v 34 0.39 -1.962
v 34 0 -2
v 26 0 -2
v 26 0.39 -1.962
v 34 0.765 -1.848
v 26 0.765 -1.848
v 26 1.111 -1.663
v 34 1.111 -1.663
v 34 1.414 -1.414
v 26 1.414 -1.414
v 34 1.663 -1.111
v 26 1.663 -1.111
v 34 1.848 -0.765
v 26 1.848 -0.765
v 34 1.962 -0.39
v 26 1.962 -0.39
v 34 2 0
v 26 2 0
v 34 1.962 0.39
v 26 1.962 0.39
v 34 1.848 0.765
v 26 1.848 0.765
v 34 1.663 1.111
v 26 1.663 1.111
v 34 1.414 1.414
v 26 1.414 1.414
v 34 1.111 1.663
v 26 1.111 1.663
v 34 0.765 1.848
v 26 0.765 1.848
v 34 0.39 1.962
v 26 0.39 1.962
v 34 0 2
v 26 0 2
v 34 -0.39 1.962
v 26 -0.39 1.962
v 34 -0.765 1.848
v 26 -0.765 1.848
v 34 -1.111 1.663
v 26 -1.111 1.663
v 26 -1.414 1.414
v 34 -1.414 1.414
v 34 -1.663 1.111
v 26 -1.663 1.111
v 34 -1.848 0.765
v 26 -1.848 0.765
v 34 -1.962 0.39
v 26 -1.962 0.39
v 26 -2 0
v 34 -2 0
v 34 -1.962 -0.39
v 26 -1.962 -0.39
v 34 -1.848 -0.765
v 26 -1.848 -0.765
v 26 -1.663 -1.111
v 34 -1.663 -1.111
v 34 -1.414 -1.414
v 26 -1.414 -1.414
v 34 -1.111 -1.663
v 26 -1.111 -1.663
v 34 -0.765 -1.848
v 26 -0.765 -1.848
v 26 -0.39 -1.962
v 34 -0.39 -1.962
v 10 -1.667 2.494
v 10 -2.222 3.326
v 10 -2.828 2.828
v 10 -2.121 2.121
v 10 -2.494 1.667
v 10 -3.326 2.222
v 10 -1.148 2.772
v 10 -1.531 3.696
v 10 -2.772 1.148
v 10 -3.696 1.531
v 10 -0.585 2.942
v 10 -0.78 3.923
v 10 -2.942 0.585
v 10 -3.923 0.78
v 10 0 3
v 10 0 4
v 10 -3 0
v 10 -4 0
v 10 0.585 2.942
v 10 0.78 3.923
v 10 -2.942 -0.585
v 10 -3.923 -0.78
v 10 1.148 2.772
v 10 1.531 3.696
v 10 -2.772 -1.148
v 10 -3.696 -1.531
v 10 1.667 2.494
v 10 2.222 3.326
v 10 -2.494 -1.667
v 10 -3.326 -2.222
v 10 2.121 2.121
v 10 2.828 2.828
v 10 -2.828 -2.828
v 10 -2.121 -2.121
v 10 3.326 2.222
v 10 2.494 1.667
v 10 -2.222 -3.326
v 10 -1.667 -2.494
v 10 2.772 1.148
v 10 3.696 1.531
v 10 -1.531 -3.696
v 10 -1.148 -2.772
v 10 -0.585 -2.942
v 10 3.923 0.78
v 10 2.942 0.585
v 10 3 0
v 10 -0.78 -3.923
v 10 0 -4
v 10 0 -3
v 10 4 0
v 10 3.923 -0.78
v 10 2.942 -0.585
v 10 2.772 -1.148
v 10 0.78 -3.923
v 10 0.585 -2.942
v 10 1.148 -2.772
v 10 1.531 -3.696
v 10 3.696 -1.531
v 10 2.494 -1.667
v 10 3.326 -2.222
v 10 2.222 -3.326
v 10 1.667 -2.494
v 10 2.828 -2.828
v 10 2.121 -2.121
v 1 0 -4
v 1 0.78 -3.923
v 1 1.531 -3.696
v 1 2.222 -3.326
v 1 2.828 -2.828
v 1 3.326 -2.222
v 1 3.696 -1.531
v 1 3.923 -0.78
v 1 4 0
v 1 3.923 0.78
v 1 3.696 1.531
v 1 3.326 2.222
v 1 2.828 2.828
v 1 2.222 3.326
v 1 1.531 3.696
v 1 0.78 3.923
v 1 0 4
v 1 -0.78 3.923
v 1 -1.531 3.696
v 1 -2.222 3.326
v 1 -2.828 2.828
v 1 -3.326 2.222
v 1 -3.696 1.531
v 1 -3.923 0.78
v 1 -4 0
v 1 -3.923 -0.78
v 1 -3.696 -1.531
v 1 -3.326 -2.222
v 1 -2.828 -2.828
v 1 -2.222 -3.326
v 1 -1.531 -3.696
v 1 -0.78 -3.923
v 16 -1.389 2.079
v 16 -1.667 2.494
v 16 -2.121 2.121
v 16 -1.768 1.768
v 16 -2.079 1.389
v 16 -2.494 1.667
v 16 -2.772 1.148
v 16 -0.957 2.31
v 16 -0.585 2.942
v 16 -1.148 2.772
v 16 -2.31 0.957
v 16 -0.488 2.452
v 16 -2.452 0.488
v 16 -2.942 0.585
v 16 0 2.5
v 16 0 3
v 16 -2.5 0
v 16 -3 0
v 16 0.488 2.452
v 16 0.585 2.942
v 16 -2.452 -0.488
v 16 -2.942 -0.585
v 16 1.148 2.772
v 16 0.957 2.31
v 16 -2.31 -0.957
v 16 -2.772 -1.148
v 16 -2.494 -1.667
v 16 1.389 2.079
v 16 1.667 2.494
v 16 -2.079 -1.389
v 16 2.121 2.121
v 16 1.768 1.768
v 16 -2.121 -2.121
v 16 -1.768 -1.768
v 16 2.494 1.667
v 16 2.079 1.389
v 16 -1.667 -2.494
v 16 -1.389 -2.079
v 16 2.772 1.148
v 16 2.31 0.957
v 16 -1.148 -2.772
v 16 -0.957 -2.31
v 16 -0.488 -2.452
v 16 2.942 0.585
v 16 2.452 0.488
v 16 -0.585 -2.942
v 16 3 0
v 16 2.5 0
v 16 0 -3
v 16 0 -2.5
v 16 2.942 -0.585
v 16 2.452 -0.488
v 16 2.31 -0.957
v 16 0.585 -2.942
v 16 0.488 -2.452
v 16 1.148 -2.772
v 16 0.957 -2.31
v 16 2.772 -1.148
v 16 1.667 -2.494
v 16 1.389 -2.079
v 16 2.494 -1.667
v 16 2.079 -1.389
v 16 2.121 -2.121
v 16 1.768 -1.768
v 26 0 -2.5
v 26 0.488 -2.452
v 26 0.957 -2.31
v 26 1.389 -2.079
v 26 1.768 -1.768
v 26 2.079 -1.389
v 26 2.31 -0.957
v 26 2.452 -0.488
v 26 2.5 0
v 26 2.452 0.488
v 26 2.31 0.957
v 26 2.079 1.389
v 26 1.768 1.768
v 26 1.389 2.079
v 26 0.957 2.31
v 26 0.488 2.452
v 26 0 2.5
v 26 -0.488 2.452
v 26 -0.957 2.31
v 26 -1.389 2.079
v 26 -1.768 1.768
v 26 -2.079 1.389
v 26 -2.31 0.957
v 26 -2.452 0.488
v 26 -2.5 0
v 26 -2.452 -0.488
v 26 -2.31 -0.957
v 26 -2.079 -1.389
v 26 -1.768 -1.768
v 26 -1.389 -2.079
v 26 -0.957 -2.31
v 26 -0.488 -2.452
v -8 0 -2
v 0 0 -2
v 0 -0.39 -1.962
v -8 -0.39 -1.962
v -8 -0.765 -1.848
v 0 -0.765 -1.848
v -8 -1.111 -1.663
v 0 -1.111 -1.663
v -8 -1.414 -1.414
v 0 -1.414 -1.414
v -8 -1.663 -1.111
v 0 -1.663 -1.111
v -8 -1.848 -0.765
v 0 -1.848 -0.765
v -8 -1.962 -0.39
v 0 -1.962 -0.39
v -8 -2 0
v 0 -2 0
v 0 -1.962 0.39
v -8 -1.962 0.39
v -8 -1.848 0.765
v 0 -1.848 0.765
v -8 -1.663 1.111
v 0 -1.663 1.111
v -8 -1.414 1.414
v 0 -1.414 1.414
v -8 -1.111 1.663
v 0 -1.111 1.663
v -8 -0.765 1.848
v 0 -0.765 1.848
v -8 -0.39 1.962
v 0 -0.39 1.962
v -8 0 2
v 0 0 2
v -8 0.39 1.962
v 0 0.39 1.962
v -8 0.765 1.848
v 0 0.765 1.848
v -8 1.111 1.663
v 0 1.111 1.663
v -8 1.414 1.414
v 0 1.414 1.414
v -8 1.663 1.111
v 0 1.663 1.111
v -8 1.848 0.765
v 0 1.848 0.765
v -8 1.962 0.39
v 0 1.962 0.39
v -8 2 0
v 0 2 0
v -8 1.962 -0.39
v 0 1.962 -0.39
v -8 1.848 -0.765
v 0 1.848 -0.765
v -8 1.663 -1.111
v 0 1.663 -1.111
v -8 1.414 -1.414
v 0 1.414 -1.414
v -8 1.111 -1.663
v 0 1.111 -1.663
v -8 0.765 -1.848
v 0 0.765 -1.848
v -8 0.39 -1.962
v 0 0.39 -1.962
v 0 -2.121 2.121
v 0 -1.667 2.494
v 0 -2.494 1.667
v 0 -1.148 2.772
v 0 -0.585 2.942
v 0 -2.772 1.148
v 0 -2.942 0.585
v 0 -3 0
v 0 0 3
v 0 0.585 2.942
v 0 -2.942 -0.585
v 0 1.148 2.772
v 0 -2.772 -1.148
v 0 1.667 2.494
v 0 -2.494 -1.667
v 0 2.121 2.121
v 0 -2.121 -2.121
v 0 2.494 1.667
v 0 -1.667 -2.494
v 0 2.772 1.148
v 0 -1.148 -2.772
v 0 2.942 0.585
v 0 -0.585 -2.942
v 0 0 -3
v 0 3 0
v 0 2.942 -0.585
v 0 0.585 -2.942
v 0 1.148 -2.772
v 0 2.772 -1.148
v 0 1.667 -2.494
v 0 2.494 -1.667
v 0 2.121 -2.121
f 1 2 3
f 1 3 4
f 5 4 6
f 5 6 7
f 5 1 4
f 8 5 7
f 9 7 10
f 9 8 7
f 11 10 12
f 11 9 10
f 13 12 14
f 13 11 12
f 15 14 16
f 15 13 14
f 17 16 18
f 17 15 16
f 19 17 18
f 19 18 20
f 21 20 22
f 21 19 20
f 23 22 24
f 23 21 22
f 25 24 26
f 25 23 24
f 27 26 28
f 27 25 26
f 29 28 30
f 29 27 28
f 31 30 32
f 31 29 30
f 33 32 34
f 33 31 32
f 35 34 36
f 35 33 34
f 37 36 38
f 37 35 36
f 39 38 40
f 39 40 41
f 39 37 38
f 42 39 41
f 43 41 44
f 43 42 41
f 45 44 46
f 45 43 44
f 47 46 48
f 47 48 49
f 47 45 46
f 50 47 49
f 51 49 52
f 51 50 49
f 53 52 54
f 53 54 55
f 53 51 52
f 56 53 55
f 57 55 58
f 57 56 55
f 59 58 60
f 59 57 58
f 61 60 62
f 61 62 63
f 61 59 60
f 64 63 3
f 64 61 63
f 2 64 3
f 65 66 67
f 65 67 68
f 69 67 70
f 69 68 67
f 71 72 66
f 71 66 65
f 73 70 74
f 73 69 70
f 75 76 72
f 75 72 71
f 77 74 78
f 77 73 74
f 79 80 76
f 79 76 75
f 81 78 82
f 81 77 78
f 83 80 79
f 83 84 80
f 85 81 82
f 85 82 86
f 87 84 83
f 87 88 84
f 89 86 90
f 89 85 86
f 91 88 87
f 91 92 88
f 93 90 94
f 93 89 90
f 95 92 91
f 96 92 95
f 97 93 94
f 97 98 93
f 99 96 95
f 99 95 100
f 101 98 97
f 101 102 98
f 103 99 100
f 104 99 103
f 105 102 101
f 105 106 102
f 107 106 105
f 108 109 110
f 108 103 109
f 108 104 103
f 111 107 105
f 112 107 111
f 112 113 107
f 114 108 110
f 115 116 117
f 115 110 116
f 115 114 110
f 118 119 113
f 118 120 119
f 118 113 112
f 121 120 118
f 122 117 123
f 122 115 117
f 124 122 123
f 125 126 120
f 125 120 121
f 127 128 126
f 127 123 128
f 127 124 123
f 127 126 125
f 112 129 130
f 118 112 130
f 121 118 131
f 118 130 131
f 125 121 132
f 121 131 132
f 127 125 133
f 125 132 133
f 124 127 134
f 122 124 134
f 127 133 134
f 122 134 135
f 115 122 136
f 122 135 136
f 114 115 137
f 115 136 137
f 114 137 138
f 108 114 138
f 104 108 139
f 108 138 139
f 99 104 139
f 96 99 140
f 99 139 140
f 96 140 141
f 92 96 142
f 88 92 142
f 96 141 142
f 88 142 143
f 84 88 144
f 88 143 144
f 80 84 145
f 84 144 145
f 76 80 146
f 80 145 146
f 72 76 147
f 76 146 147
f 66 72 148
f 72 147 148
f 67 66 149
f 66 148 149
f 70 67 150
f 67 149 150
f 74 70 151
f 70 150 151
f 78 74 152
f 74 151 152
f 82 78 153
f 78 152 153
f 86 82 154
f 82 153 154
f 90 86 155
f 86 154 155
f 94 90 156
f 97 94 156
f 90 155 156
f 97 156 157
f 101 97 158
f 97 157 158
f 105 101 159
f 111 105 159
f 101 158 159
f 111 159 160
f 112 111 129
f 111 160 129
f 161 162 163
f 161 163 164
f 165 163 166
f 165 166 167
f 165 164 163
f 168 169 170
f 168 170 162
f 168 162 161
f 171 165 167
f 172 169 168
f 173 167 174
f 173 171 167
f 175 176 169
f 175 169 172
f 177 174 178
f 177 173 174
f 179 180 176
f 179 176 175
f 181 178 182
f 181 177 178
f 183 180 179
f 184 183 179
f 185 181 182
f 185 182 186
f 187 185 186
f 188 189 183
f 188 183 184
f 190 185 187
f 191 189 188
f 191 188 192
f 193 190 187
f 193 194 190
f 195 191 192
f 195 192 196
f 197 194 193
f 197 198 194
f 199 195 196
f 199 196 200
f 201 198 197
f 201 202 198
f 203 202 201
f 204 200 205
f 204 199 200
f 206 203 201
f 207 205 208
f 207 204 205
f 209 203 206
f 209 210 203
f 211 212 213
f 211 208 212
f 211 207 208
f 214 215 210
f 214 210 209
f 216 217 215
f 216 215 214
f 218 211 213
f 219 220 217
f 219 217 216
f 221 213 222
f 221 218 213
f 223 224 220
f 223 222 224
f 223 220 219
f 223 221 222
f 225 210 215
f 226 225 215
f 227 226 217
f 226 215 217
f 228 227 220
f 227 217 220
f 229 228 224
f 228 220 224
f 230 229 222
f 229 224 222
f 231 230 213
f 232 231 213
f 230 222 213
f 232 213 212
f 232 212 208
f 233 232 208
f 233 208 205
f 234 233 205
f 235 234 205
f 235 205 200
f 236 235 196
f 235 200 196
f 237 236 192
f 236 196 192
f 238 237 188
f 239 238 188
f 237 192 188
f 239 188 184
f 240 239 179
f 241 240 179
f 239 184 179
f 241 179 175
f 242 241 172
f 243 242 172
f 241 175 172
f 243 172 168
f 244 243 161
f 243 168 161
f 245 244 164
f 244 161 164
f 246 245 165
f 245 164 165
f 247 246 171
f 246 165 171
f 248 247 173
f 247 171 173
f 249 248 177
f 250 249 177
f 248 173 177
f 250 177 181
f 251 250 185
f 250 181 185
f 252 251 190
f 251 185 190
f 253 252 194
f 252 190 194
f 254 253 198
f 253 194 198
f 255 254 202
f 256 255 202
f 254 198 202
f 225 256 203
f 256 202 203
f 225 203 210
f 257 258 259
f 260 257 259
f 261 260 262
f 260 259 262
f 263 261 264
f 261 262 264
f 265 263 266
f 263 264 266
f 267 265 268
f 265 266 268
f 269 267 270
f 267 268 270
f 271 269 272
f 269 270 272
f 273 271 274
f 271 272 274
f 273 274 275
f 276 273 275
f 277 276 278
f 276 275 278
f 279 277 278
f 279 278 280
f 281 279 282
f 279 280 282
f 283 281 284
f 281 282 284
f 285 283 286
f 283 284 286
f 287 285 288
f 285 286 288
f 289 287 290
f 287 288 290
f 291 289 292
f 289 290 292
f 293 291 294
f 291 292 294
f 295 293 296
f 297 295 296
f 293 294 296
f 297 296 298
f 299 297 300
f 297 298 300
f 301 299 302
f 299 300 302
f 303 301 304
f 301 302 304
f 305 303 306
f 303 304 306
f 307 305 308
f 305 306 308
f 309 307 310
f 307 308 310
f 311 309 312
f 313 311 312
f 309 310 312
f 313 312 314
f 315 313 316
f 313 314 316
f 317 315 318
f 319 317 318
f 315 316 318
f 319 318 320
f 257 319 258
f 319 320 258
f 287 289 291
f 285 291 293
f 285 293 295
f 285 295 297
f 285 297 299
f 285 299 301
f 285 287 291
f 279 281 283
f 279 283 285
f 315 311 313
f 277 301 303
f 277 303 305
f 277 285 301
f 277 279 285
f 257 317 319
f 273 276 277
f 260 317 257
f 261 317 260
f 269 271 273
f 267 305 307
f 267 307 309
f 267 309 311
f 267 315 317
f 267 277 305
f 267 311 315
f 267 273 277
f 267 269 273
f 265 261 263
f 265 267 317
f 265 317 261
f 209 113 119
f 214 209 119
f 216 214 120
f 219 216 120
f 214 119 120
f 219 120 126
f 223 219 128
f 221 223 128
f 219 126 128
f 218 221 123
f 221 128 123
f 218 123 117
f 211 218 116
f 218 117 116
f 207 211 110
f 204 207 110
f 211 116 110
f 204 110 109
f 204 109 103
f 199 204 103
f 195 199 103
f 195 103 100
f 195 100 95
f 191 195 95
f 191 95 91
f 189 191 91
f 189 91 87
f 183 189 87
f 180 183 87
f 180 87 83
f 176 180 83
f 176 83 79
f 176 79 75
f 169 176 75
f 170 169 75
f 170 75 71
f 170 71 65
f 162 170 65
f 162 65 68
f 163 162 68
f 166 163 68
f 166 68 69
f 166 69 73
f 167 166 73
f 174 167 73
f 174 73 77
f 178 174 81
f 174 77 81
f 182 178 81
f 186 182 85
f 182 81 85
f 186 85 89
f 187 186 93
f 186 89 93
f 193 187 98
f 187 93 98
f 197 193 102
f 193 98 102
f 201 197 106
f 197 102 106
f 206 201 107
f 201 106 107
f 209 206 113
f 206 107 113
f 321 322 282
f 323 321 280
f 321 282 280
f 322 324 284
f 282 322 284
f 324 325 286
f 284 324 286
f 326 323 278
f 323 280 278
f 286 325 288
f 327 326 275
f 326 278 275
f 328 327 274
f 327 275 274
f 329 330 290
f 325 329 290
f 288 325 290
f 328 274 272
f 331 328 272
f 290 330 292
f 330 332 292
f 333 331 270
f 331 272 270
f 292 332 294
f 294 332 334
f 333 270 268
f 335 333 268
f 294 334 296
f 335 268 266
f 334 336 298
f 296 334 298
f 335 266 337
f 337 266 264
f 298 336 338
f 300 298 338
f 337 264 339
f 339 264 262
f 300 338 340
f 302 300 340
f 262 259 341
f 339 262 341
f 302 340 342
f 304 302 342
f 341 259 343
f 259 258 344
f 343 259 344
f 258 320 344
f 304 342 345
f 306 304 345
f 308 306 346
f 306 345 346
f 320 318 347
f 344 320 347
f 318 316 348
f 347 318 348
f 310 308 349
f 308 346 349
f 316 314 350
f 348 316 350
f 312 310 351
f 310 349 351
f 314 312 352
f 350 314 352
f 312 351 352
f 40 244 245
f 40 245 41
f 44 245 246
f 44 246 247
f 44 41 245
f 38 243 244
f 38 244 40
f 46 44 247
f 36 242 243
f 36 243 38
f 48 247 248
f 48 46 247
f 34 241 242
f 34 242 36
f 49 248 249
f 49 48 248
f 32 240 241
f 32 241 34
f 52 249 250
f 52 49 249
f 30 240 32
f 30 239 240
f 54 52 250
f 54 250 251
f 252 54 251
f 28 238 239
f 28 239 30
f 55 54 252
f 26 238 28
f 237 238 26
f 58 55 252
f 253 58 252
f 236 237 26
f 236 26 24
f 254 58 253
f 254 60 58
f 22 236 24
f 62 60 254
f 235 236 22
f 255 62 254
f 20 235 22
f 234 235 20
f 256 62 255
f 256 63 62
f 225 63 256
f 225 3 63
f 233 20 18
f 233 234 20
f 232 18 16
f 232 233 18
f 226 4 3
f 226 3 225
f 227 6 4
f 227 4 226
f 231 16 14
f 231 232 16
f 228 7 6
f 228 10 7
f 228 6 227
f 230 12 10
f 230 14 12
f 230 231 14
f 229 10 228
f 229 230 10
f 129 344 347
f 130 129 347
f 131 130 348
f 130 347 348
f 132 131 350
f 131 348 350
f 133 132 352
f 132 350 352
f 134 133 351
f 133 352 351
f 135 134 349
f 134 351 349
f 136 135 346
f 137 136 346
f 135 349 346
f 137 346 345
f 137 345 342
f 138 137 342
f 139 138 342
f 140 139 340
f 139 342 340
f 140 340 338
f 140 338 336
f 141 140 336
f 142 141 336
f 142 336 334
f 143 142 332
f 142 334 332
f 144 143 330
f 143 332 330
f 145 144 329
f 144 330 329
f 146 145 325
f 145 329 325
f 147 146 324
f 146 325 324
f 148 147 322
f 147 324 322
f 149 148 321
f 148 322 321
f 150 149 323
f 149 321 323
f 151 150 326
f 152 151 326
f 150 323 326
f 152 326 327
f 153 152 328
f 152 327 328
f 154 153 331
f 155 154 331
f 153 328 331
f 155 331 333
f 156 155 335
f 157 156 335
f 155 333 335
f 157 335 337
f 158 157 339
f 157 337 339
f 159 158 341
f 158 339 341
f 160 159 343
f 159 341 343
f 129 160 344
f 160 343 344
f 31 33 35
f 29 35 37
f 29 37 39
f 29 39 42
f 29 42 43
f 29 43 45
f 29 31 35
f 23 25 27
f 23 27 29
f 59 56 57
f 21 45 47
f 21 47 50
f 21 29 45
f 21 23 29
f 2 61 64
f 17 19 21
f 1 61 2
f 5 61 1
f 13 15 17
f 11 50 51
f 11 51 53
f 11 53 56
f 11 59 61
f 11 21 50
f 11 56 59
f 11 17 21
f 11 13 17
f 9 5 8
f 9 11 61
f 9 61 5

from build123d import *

# Parameters (mm, degrees)
SKETCH_1_R          = 4
EXTRUDE_1_DEPTH     = 10
SKETCH_2_R          = 2
EXTRUDE_2_DEPTH     = 8
SKETCH_3_R          = 3
EXTRUDE_3_DEPTH     = 16
EXTRUDE_START       = 8
SKETCH_4_R          = 2
EXTRUDE_4_DEPTH     = 8
CHAMFER_1_SIZE      = 1
CUT_EXTRUDE_START   = -10
SKETCH_5_R          = 3
SKETCH_5_R_2        = 2.5
CUT_EXTRUDE_1_DEPTH = 10


with BuildPart() as part:
    # 草图1 → 凸台-拉伸1 (new body)
    with BuildSketch(Plane(origin=(0, 0, 0), x_dir=(0, 0, -1), z_dir=(1, 0, 0))):
        Circle(SKETCH_1_R)
    extrude(amount=EXTRUDE_1_DEPTH)

    # 草图2 → 凸台-拉伸2 (add)
    with BuildSketch(Plane.ZY):
        with Locations(Location((0, 0, 0), (0, 0, 180))):
            Circle(SKETCH_2_R)
    extrude(amount=EXTRUDE_2_DEPTH)

    # 草图3 → 凸台-拉伸3 (add)
    with BuildSketch(Plane(origin=(10, 0, 0), x_dir=(0, 0, -1), z_dir=(1, 0, 0))):
        Circle(SKETCH_3_R)
    extrude(amount=EXTRUDE_3_DEPTH)

    # 草图4 → 凸台-拉伸4 (add)
    with BuildSketch(Plane(origin=(26, 0, 0), x_dir=(0, 0, -1), z_dir=(1, 0, 0)).offset(EXTRUDE_START)):
        Circle(SKETCH_4_R)
    extrude(amount=-EXTRUDE_4_DEPTH)

    # 倒角1
    chamfer_1_edges = [part.edges().sort_by_distance(p)[0] for p in [
        (0, 0, 4),
    ]]
    chamfer(chamfer_1_edges, length=CHAMFER_1_SIZE)

    # 草图5 → 切除-拉伸1 (cut)
    with BuildSketch(Plane(origin=(26, 0, 0), x_dir=(0, 0, -1), z_dir=(1, 0, 0)).offset(CUT_EXTRUDE_START)):
        Circle(SKETCH_5_R)
        Circle(SKETCH_5_R_2, mode=Mode.SUBTRACT)
    extrude(amount=CUT_EXTRUDE_1_DEPTH, mode=Mode.SUBTRACT)


solid = part.part
